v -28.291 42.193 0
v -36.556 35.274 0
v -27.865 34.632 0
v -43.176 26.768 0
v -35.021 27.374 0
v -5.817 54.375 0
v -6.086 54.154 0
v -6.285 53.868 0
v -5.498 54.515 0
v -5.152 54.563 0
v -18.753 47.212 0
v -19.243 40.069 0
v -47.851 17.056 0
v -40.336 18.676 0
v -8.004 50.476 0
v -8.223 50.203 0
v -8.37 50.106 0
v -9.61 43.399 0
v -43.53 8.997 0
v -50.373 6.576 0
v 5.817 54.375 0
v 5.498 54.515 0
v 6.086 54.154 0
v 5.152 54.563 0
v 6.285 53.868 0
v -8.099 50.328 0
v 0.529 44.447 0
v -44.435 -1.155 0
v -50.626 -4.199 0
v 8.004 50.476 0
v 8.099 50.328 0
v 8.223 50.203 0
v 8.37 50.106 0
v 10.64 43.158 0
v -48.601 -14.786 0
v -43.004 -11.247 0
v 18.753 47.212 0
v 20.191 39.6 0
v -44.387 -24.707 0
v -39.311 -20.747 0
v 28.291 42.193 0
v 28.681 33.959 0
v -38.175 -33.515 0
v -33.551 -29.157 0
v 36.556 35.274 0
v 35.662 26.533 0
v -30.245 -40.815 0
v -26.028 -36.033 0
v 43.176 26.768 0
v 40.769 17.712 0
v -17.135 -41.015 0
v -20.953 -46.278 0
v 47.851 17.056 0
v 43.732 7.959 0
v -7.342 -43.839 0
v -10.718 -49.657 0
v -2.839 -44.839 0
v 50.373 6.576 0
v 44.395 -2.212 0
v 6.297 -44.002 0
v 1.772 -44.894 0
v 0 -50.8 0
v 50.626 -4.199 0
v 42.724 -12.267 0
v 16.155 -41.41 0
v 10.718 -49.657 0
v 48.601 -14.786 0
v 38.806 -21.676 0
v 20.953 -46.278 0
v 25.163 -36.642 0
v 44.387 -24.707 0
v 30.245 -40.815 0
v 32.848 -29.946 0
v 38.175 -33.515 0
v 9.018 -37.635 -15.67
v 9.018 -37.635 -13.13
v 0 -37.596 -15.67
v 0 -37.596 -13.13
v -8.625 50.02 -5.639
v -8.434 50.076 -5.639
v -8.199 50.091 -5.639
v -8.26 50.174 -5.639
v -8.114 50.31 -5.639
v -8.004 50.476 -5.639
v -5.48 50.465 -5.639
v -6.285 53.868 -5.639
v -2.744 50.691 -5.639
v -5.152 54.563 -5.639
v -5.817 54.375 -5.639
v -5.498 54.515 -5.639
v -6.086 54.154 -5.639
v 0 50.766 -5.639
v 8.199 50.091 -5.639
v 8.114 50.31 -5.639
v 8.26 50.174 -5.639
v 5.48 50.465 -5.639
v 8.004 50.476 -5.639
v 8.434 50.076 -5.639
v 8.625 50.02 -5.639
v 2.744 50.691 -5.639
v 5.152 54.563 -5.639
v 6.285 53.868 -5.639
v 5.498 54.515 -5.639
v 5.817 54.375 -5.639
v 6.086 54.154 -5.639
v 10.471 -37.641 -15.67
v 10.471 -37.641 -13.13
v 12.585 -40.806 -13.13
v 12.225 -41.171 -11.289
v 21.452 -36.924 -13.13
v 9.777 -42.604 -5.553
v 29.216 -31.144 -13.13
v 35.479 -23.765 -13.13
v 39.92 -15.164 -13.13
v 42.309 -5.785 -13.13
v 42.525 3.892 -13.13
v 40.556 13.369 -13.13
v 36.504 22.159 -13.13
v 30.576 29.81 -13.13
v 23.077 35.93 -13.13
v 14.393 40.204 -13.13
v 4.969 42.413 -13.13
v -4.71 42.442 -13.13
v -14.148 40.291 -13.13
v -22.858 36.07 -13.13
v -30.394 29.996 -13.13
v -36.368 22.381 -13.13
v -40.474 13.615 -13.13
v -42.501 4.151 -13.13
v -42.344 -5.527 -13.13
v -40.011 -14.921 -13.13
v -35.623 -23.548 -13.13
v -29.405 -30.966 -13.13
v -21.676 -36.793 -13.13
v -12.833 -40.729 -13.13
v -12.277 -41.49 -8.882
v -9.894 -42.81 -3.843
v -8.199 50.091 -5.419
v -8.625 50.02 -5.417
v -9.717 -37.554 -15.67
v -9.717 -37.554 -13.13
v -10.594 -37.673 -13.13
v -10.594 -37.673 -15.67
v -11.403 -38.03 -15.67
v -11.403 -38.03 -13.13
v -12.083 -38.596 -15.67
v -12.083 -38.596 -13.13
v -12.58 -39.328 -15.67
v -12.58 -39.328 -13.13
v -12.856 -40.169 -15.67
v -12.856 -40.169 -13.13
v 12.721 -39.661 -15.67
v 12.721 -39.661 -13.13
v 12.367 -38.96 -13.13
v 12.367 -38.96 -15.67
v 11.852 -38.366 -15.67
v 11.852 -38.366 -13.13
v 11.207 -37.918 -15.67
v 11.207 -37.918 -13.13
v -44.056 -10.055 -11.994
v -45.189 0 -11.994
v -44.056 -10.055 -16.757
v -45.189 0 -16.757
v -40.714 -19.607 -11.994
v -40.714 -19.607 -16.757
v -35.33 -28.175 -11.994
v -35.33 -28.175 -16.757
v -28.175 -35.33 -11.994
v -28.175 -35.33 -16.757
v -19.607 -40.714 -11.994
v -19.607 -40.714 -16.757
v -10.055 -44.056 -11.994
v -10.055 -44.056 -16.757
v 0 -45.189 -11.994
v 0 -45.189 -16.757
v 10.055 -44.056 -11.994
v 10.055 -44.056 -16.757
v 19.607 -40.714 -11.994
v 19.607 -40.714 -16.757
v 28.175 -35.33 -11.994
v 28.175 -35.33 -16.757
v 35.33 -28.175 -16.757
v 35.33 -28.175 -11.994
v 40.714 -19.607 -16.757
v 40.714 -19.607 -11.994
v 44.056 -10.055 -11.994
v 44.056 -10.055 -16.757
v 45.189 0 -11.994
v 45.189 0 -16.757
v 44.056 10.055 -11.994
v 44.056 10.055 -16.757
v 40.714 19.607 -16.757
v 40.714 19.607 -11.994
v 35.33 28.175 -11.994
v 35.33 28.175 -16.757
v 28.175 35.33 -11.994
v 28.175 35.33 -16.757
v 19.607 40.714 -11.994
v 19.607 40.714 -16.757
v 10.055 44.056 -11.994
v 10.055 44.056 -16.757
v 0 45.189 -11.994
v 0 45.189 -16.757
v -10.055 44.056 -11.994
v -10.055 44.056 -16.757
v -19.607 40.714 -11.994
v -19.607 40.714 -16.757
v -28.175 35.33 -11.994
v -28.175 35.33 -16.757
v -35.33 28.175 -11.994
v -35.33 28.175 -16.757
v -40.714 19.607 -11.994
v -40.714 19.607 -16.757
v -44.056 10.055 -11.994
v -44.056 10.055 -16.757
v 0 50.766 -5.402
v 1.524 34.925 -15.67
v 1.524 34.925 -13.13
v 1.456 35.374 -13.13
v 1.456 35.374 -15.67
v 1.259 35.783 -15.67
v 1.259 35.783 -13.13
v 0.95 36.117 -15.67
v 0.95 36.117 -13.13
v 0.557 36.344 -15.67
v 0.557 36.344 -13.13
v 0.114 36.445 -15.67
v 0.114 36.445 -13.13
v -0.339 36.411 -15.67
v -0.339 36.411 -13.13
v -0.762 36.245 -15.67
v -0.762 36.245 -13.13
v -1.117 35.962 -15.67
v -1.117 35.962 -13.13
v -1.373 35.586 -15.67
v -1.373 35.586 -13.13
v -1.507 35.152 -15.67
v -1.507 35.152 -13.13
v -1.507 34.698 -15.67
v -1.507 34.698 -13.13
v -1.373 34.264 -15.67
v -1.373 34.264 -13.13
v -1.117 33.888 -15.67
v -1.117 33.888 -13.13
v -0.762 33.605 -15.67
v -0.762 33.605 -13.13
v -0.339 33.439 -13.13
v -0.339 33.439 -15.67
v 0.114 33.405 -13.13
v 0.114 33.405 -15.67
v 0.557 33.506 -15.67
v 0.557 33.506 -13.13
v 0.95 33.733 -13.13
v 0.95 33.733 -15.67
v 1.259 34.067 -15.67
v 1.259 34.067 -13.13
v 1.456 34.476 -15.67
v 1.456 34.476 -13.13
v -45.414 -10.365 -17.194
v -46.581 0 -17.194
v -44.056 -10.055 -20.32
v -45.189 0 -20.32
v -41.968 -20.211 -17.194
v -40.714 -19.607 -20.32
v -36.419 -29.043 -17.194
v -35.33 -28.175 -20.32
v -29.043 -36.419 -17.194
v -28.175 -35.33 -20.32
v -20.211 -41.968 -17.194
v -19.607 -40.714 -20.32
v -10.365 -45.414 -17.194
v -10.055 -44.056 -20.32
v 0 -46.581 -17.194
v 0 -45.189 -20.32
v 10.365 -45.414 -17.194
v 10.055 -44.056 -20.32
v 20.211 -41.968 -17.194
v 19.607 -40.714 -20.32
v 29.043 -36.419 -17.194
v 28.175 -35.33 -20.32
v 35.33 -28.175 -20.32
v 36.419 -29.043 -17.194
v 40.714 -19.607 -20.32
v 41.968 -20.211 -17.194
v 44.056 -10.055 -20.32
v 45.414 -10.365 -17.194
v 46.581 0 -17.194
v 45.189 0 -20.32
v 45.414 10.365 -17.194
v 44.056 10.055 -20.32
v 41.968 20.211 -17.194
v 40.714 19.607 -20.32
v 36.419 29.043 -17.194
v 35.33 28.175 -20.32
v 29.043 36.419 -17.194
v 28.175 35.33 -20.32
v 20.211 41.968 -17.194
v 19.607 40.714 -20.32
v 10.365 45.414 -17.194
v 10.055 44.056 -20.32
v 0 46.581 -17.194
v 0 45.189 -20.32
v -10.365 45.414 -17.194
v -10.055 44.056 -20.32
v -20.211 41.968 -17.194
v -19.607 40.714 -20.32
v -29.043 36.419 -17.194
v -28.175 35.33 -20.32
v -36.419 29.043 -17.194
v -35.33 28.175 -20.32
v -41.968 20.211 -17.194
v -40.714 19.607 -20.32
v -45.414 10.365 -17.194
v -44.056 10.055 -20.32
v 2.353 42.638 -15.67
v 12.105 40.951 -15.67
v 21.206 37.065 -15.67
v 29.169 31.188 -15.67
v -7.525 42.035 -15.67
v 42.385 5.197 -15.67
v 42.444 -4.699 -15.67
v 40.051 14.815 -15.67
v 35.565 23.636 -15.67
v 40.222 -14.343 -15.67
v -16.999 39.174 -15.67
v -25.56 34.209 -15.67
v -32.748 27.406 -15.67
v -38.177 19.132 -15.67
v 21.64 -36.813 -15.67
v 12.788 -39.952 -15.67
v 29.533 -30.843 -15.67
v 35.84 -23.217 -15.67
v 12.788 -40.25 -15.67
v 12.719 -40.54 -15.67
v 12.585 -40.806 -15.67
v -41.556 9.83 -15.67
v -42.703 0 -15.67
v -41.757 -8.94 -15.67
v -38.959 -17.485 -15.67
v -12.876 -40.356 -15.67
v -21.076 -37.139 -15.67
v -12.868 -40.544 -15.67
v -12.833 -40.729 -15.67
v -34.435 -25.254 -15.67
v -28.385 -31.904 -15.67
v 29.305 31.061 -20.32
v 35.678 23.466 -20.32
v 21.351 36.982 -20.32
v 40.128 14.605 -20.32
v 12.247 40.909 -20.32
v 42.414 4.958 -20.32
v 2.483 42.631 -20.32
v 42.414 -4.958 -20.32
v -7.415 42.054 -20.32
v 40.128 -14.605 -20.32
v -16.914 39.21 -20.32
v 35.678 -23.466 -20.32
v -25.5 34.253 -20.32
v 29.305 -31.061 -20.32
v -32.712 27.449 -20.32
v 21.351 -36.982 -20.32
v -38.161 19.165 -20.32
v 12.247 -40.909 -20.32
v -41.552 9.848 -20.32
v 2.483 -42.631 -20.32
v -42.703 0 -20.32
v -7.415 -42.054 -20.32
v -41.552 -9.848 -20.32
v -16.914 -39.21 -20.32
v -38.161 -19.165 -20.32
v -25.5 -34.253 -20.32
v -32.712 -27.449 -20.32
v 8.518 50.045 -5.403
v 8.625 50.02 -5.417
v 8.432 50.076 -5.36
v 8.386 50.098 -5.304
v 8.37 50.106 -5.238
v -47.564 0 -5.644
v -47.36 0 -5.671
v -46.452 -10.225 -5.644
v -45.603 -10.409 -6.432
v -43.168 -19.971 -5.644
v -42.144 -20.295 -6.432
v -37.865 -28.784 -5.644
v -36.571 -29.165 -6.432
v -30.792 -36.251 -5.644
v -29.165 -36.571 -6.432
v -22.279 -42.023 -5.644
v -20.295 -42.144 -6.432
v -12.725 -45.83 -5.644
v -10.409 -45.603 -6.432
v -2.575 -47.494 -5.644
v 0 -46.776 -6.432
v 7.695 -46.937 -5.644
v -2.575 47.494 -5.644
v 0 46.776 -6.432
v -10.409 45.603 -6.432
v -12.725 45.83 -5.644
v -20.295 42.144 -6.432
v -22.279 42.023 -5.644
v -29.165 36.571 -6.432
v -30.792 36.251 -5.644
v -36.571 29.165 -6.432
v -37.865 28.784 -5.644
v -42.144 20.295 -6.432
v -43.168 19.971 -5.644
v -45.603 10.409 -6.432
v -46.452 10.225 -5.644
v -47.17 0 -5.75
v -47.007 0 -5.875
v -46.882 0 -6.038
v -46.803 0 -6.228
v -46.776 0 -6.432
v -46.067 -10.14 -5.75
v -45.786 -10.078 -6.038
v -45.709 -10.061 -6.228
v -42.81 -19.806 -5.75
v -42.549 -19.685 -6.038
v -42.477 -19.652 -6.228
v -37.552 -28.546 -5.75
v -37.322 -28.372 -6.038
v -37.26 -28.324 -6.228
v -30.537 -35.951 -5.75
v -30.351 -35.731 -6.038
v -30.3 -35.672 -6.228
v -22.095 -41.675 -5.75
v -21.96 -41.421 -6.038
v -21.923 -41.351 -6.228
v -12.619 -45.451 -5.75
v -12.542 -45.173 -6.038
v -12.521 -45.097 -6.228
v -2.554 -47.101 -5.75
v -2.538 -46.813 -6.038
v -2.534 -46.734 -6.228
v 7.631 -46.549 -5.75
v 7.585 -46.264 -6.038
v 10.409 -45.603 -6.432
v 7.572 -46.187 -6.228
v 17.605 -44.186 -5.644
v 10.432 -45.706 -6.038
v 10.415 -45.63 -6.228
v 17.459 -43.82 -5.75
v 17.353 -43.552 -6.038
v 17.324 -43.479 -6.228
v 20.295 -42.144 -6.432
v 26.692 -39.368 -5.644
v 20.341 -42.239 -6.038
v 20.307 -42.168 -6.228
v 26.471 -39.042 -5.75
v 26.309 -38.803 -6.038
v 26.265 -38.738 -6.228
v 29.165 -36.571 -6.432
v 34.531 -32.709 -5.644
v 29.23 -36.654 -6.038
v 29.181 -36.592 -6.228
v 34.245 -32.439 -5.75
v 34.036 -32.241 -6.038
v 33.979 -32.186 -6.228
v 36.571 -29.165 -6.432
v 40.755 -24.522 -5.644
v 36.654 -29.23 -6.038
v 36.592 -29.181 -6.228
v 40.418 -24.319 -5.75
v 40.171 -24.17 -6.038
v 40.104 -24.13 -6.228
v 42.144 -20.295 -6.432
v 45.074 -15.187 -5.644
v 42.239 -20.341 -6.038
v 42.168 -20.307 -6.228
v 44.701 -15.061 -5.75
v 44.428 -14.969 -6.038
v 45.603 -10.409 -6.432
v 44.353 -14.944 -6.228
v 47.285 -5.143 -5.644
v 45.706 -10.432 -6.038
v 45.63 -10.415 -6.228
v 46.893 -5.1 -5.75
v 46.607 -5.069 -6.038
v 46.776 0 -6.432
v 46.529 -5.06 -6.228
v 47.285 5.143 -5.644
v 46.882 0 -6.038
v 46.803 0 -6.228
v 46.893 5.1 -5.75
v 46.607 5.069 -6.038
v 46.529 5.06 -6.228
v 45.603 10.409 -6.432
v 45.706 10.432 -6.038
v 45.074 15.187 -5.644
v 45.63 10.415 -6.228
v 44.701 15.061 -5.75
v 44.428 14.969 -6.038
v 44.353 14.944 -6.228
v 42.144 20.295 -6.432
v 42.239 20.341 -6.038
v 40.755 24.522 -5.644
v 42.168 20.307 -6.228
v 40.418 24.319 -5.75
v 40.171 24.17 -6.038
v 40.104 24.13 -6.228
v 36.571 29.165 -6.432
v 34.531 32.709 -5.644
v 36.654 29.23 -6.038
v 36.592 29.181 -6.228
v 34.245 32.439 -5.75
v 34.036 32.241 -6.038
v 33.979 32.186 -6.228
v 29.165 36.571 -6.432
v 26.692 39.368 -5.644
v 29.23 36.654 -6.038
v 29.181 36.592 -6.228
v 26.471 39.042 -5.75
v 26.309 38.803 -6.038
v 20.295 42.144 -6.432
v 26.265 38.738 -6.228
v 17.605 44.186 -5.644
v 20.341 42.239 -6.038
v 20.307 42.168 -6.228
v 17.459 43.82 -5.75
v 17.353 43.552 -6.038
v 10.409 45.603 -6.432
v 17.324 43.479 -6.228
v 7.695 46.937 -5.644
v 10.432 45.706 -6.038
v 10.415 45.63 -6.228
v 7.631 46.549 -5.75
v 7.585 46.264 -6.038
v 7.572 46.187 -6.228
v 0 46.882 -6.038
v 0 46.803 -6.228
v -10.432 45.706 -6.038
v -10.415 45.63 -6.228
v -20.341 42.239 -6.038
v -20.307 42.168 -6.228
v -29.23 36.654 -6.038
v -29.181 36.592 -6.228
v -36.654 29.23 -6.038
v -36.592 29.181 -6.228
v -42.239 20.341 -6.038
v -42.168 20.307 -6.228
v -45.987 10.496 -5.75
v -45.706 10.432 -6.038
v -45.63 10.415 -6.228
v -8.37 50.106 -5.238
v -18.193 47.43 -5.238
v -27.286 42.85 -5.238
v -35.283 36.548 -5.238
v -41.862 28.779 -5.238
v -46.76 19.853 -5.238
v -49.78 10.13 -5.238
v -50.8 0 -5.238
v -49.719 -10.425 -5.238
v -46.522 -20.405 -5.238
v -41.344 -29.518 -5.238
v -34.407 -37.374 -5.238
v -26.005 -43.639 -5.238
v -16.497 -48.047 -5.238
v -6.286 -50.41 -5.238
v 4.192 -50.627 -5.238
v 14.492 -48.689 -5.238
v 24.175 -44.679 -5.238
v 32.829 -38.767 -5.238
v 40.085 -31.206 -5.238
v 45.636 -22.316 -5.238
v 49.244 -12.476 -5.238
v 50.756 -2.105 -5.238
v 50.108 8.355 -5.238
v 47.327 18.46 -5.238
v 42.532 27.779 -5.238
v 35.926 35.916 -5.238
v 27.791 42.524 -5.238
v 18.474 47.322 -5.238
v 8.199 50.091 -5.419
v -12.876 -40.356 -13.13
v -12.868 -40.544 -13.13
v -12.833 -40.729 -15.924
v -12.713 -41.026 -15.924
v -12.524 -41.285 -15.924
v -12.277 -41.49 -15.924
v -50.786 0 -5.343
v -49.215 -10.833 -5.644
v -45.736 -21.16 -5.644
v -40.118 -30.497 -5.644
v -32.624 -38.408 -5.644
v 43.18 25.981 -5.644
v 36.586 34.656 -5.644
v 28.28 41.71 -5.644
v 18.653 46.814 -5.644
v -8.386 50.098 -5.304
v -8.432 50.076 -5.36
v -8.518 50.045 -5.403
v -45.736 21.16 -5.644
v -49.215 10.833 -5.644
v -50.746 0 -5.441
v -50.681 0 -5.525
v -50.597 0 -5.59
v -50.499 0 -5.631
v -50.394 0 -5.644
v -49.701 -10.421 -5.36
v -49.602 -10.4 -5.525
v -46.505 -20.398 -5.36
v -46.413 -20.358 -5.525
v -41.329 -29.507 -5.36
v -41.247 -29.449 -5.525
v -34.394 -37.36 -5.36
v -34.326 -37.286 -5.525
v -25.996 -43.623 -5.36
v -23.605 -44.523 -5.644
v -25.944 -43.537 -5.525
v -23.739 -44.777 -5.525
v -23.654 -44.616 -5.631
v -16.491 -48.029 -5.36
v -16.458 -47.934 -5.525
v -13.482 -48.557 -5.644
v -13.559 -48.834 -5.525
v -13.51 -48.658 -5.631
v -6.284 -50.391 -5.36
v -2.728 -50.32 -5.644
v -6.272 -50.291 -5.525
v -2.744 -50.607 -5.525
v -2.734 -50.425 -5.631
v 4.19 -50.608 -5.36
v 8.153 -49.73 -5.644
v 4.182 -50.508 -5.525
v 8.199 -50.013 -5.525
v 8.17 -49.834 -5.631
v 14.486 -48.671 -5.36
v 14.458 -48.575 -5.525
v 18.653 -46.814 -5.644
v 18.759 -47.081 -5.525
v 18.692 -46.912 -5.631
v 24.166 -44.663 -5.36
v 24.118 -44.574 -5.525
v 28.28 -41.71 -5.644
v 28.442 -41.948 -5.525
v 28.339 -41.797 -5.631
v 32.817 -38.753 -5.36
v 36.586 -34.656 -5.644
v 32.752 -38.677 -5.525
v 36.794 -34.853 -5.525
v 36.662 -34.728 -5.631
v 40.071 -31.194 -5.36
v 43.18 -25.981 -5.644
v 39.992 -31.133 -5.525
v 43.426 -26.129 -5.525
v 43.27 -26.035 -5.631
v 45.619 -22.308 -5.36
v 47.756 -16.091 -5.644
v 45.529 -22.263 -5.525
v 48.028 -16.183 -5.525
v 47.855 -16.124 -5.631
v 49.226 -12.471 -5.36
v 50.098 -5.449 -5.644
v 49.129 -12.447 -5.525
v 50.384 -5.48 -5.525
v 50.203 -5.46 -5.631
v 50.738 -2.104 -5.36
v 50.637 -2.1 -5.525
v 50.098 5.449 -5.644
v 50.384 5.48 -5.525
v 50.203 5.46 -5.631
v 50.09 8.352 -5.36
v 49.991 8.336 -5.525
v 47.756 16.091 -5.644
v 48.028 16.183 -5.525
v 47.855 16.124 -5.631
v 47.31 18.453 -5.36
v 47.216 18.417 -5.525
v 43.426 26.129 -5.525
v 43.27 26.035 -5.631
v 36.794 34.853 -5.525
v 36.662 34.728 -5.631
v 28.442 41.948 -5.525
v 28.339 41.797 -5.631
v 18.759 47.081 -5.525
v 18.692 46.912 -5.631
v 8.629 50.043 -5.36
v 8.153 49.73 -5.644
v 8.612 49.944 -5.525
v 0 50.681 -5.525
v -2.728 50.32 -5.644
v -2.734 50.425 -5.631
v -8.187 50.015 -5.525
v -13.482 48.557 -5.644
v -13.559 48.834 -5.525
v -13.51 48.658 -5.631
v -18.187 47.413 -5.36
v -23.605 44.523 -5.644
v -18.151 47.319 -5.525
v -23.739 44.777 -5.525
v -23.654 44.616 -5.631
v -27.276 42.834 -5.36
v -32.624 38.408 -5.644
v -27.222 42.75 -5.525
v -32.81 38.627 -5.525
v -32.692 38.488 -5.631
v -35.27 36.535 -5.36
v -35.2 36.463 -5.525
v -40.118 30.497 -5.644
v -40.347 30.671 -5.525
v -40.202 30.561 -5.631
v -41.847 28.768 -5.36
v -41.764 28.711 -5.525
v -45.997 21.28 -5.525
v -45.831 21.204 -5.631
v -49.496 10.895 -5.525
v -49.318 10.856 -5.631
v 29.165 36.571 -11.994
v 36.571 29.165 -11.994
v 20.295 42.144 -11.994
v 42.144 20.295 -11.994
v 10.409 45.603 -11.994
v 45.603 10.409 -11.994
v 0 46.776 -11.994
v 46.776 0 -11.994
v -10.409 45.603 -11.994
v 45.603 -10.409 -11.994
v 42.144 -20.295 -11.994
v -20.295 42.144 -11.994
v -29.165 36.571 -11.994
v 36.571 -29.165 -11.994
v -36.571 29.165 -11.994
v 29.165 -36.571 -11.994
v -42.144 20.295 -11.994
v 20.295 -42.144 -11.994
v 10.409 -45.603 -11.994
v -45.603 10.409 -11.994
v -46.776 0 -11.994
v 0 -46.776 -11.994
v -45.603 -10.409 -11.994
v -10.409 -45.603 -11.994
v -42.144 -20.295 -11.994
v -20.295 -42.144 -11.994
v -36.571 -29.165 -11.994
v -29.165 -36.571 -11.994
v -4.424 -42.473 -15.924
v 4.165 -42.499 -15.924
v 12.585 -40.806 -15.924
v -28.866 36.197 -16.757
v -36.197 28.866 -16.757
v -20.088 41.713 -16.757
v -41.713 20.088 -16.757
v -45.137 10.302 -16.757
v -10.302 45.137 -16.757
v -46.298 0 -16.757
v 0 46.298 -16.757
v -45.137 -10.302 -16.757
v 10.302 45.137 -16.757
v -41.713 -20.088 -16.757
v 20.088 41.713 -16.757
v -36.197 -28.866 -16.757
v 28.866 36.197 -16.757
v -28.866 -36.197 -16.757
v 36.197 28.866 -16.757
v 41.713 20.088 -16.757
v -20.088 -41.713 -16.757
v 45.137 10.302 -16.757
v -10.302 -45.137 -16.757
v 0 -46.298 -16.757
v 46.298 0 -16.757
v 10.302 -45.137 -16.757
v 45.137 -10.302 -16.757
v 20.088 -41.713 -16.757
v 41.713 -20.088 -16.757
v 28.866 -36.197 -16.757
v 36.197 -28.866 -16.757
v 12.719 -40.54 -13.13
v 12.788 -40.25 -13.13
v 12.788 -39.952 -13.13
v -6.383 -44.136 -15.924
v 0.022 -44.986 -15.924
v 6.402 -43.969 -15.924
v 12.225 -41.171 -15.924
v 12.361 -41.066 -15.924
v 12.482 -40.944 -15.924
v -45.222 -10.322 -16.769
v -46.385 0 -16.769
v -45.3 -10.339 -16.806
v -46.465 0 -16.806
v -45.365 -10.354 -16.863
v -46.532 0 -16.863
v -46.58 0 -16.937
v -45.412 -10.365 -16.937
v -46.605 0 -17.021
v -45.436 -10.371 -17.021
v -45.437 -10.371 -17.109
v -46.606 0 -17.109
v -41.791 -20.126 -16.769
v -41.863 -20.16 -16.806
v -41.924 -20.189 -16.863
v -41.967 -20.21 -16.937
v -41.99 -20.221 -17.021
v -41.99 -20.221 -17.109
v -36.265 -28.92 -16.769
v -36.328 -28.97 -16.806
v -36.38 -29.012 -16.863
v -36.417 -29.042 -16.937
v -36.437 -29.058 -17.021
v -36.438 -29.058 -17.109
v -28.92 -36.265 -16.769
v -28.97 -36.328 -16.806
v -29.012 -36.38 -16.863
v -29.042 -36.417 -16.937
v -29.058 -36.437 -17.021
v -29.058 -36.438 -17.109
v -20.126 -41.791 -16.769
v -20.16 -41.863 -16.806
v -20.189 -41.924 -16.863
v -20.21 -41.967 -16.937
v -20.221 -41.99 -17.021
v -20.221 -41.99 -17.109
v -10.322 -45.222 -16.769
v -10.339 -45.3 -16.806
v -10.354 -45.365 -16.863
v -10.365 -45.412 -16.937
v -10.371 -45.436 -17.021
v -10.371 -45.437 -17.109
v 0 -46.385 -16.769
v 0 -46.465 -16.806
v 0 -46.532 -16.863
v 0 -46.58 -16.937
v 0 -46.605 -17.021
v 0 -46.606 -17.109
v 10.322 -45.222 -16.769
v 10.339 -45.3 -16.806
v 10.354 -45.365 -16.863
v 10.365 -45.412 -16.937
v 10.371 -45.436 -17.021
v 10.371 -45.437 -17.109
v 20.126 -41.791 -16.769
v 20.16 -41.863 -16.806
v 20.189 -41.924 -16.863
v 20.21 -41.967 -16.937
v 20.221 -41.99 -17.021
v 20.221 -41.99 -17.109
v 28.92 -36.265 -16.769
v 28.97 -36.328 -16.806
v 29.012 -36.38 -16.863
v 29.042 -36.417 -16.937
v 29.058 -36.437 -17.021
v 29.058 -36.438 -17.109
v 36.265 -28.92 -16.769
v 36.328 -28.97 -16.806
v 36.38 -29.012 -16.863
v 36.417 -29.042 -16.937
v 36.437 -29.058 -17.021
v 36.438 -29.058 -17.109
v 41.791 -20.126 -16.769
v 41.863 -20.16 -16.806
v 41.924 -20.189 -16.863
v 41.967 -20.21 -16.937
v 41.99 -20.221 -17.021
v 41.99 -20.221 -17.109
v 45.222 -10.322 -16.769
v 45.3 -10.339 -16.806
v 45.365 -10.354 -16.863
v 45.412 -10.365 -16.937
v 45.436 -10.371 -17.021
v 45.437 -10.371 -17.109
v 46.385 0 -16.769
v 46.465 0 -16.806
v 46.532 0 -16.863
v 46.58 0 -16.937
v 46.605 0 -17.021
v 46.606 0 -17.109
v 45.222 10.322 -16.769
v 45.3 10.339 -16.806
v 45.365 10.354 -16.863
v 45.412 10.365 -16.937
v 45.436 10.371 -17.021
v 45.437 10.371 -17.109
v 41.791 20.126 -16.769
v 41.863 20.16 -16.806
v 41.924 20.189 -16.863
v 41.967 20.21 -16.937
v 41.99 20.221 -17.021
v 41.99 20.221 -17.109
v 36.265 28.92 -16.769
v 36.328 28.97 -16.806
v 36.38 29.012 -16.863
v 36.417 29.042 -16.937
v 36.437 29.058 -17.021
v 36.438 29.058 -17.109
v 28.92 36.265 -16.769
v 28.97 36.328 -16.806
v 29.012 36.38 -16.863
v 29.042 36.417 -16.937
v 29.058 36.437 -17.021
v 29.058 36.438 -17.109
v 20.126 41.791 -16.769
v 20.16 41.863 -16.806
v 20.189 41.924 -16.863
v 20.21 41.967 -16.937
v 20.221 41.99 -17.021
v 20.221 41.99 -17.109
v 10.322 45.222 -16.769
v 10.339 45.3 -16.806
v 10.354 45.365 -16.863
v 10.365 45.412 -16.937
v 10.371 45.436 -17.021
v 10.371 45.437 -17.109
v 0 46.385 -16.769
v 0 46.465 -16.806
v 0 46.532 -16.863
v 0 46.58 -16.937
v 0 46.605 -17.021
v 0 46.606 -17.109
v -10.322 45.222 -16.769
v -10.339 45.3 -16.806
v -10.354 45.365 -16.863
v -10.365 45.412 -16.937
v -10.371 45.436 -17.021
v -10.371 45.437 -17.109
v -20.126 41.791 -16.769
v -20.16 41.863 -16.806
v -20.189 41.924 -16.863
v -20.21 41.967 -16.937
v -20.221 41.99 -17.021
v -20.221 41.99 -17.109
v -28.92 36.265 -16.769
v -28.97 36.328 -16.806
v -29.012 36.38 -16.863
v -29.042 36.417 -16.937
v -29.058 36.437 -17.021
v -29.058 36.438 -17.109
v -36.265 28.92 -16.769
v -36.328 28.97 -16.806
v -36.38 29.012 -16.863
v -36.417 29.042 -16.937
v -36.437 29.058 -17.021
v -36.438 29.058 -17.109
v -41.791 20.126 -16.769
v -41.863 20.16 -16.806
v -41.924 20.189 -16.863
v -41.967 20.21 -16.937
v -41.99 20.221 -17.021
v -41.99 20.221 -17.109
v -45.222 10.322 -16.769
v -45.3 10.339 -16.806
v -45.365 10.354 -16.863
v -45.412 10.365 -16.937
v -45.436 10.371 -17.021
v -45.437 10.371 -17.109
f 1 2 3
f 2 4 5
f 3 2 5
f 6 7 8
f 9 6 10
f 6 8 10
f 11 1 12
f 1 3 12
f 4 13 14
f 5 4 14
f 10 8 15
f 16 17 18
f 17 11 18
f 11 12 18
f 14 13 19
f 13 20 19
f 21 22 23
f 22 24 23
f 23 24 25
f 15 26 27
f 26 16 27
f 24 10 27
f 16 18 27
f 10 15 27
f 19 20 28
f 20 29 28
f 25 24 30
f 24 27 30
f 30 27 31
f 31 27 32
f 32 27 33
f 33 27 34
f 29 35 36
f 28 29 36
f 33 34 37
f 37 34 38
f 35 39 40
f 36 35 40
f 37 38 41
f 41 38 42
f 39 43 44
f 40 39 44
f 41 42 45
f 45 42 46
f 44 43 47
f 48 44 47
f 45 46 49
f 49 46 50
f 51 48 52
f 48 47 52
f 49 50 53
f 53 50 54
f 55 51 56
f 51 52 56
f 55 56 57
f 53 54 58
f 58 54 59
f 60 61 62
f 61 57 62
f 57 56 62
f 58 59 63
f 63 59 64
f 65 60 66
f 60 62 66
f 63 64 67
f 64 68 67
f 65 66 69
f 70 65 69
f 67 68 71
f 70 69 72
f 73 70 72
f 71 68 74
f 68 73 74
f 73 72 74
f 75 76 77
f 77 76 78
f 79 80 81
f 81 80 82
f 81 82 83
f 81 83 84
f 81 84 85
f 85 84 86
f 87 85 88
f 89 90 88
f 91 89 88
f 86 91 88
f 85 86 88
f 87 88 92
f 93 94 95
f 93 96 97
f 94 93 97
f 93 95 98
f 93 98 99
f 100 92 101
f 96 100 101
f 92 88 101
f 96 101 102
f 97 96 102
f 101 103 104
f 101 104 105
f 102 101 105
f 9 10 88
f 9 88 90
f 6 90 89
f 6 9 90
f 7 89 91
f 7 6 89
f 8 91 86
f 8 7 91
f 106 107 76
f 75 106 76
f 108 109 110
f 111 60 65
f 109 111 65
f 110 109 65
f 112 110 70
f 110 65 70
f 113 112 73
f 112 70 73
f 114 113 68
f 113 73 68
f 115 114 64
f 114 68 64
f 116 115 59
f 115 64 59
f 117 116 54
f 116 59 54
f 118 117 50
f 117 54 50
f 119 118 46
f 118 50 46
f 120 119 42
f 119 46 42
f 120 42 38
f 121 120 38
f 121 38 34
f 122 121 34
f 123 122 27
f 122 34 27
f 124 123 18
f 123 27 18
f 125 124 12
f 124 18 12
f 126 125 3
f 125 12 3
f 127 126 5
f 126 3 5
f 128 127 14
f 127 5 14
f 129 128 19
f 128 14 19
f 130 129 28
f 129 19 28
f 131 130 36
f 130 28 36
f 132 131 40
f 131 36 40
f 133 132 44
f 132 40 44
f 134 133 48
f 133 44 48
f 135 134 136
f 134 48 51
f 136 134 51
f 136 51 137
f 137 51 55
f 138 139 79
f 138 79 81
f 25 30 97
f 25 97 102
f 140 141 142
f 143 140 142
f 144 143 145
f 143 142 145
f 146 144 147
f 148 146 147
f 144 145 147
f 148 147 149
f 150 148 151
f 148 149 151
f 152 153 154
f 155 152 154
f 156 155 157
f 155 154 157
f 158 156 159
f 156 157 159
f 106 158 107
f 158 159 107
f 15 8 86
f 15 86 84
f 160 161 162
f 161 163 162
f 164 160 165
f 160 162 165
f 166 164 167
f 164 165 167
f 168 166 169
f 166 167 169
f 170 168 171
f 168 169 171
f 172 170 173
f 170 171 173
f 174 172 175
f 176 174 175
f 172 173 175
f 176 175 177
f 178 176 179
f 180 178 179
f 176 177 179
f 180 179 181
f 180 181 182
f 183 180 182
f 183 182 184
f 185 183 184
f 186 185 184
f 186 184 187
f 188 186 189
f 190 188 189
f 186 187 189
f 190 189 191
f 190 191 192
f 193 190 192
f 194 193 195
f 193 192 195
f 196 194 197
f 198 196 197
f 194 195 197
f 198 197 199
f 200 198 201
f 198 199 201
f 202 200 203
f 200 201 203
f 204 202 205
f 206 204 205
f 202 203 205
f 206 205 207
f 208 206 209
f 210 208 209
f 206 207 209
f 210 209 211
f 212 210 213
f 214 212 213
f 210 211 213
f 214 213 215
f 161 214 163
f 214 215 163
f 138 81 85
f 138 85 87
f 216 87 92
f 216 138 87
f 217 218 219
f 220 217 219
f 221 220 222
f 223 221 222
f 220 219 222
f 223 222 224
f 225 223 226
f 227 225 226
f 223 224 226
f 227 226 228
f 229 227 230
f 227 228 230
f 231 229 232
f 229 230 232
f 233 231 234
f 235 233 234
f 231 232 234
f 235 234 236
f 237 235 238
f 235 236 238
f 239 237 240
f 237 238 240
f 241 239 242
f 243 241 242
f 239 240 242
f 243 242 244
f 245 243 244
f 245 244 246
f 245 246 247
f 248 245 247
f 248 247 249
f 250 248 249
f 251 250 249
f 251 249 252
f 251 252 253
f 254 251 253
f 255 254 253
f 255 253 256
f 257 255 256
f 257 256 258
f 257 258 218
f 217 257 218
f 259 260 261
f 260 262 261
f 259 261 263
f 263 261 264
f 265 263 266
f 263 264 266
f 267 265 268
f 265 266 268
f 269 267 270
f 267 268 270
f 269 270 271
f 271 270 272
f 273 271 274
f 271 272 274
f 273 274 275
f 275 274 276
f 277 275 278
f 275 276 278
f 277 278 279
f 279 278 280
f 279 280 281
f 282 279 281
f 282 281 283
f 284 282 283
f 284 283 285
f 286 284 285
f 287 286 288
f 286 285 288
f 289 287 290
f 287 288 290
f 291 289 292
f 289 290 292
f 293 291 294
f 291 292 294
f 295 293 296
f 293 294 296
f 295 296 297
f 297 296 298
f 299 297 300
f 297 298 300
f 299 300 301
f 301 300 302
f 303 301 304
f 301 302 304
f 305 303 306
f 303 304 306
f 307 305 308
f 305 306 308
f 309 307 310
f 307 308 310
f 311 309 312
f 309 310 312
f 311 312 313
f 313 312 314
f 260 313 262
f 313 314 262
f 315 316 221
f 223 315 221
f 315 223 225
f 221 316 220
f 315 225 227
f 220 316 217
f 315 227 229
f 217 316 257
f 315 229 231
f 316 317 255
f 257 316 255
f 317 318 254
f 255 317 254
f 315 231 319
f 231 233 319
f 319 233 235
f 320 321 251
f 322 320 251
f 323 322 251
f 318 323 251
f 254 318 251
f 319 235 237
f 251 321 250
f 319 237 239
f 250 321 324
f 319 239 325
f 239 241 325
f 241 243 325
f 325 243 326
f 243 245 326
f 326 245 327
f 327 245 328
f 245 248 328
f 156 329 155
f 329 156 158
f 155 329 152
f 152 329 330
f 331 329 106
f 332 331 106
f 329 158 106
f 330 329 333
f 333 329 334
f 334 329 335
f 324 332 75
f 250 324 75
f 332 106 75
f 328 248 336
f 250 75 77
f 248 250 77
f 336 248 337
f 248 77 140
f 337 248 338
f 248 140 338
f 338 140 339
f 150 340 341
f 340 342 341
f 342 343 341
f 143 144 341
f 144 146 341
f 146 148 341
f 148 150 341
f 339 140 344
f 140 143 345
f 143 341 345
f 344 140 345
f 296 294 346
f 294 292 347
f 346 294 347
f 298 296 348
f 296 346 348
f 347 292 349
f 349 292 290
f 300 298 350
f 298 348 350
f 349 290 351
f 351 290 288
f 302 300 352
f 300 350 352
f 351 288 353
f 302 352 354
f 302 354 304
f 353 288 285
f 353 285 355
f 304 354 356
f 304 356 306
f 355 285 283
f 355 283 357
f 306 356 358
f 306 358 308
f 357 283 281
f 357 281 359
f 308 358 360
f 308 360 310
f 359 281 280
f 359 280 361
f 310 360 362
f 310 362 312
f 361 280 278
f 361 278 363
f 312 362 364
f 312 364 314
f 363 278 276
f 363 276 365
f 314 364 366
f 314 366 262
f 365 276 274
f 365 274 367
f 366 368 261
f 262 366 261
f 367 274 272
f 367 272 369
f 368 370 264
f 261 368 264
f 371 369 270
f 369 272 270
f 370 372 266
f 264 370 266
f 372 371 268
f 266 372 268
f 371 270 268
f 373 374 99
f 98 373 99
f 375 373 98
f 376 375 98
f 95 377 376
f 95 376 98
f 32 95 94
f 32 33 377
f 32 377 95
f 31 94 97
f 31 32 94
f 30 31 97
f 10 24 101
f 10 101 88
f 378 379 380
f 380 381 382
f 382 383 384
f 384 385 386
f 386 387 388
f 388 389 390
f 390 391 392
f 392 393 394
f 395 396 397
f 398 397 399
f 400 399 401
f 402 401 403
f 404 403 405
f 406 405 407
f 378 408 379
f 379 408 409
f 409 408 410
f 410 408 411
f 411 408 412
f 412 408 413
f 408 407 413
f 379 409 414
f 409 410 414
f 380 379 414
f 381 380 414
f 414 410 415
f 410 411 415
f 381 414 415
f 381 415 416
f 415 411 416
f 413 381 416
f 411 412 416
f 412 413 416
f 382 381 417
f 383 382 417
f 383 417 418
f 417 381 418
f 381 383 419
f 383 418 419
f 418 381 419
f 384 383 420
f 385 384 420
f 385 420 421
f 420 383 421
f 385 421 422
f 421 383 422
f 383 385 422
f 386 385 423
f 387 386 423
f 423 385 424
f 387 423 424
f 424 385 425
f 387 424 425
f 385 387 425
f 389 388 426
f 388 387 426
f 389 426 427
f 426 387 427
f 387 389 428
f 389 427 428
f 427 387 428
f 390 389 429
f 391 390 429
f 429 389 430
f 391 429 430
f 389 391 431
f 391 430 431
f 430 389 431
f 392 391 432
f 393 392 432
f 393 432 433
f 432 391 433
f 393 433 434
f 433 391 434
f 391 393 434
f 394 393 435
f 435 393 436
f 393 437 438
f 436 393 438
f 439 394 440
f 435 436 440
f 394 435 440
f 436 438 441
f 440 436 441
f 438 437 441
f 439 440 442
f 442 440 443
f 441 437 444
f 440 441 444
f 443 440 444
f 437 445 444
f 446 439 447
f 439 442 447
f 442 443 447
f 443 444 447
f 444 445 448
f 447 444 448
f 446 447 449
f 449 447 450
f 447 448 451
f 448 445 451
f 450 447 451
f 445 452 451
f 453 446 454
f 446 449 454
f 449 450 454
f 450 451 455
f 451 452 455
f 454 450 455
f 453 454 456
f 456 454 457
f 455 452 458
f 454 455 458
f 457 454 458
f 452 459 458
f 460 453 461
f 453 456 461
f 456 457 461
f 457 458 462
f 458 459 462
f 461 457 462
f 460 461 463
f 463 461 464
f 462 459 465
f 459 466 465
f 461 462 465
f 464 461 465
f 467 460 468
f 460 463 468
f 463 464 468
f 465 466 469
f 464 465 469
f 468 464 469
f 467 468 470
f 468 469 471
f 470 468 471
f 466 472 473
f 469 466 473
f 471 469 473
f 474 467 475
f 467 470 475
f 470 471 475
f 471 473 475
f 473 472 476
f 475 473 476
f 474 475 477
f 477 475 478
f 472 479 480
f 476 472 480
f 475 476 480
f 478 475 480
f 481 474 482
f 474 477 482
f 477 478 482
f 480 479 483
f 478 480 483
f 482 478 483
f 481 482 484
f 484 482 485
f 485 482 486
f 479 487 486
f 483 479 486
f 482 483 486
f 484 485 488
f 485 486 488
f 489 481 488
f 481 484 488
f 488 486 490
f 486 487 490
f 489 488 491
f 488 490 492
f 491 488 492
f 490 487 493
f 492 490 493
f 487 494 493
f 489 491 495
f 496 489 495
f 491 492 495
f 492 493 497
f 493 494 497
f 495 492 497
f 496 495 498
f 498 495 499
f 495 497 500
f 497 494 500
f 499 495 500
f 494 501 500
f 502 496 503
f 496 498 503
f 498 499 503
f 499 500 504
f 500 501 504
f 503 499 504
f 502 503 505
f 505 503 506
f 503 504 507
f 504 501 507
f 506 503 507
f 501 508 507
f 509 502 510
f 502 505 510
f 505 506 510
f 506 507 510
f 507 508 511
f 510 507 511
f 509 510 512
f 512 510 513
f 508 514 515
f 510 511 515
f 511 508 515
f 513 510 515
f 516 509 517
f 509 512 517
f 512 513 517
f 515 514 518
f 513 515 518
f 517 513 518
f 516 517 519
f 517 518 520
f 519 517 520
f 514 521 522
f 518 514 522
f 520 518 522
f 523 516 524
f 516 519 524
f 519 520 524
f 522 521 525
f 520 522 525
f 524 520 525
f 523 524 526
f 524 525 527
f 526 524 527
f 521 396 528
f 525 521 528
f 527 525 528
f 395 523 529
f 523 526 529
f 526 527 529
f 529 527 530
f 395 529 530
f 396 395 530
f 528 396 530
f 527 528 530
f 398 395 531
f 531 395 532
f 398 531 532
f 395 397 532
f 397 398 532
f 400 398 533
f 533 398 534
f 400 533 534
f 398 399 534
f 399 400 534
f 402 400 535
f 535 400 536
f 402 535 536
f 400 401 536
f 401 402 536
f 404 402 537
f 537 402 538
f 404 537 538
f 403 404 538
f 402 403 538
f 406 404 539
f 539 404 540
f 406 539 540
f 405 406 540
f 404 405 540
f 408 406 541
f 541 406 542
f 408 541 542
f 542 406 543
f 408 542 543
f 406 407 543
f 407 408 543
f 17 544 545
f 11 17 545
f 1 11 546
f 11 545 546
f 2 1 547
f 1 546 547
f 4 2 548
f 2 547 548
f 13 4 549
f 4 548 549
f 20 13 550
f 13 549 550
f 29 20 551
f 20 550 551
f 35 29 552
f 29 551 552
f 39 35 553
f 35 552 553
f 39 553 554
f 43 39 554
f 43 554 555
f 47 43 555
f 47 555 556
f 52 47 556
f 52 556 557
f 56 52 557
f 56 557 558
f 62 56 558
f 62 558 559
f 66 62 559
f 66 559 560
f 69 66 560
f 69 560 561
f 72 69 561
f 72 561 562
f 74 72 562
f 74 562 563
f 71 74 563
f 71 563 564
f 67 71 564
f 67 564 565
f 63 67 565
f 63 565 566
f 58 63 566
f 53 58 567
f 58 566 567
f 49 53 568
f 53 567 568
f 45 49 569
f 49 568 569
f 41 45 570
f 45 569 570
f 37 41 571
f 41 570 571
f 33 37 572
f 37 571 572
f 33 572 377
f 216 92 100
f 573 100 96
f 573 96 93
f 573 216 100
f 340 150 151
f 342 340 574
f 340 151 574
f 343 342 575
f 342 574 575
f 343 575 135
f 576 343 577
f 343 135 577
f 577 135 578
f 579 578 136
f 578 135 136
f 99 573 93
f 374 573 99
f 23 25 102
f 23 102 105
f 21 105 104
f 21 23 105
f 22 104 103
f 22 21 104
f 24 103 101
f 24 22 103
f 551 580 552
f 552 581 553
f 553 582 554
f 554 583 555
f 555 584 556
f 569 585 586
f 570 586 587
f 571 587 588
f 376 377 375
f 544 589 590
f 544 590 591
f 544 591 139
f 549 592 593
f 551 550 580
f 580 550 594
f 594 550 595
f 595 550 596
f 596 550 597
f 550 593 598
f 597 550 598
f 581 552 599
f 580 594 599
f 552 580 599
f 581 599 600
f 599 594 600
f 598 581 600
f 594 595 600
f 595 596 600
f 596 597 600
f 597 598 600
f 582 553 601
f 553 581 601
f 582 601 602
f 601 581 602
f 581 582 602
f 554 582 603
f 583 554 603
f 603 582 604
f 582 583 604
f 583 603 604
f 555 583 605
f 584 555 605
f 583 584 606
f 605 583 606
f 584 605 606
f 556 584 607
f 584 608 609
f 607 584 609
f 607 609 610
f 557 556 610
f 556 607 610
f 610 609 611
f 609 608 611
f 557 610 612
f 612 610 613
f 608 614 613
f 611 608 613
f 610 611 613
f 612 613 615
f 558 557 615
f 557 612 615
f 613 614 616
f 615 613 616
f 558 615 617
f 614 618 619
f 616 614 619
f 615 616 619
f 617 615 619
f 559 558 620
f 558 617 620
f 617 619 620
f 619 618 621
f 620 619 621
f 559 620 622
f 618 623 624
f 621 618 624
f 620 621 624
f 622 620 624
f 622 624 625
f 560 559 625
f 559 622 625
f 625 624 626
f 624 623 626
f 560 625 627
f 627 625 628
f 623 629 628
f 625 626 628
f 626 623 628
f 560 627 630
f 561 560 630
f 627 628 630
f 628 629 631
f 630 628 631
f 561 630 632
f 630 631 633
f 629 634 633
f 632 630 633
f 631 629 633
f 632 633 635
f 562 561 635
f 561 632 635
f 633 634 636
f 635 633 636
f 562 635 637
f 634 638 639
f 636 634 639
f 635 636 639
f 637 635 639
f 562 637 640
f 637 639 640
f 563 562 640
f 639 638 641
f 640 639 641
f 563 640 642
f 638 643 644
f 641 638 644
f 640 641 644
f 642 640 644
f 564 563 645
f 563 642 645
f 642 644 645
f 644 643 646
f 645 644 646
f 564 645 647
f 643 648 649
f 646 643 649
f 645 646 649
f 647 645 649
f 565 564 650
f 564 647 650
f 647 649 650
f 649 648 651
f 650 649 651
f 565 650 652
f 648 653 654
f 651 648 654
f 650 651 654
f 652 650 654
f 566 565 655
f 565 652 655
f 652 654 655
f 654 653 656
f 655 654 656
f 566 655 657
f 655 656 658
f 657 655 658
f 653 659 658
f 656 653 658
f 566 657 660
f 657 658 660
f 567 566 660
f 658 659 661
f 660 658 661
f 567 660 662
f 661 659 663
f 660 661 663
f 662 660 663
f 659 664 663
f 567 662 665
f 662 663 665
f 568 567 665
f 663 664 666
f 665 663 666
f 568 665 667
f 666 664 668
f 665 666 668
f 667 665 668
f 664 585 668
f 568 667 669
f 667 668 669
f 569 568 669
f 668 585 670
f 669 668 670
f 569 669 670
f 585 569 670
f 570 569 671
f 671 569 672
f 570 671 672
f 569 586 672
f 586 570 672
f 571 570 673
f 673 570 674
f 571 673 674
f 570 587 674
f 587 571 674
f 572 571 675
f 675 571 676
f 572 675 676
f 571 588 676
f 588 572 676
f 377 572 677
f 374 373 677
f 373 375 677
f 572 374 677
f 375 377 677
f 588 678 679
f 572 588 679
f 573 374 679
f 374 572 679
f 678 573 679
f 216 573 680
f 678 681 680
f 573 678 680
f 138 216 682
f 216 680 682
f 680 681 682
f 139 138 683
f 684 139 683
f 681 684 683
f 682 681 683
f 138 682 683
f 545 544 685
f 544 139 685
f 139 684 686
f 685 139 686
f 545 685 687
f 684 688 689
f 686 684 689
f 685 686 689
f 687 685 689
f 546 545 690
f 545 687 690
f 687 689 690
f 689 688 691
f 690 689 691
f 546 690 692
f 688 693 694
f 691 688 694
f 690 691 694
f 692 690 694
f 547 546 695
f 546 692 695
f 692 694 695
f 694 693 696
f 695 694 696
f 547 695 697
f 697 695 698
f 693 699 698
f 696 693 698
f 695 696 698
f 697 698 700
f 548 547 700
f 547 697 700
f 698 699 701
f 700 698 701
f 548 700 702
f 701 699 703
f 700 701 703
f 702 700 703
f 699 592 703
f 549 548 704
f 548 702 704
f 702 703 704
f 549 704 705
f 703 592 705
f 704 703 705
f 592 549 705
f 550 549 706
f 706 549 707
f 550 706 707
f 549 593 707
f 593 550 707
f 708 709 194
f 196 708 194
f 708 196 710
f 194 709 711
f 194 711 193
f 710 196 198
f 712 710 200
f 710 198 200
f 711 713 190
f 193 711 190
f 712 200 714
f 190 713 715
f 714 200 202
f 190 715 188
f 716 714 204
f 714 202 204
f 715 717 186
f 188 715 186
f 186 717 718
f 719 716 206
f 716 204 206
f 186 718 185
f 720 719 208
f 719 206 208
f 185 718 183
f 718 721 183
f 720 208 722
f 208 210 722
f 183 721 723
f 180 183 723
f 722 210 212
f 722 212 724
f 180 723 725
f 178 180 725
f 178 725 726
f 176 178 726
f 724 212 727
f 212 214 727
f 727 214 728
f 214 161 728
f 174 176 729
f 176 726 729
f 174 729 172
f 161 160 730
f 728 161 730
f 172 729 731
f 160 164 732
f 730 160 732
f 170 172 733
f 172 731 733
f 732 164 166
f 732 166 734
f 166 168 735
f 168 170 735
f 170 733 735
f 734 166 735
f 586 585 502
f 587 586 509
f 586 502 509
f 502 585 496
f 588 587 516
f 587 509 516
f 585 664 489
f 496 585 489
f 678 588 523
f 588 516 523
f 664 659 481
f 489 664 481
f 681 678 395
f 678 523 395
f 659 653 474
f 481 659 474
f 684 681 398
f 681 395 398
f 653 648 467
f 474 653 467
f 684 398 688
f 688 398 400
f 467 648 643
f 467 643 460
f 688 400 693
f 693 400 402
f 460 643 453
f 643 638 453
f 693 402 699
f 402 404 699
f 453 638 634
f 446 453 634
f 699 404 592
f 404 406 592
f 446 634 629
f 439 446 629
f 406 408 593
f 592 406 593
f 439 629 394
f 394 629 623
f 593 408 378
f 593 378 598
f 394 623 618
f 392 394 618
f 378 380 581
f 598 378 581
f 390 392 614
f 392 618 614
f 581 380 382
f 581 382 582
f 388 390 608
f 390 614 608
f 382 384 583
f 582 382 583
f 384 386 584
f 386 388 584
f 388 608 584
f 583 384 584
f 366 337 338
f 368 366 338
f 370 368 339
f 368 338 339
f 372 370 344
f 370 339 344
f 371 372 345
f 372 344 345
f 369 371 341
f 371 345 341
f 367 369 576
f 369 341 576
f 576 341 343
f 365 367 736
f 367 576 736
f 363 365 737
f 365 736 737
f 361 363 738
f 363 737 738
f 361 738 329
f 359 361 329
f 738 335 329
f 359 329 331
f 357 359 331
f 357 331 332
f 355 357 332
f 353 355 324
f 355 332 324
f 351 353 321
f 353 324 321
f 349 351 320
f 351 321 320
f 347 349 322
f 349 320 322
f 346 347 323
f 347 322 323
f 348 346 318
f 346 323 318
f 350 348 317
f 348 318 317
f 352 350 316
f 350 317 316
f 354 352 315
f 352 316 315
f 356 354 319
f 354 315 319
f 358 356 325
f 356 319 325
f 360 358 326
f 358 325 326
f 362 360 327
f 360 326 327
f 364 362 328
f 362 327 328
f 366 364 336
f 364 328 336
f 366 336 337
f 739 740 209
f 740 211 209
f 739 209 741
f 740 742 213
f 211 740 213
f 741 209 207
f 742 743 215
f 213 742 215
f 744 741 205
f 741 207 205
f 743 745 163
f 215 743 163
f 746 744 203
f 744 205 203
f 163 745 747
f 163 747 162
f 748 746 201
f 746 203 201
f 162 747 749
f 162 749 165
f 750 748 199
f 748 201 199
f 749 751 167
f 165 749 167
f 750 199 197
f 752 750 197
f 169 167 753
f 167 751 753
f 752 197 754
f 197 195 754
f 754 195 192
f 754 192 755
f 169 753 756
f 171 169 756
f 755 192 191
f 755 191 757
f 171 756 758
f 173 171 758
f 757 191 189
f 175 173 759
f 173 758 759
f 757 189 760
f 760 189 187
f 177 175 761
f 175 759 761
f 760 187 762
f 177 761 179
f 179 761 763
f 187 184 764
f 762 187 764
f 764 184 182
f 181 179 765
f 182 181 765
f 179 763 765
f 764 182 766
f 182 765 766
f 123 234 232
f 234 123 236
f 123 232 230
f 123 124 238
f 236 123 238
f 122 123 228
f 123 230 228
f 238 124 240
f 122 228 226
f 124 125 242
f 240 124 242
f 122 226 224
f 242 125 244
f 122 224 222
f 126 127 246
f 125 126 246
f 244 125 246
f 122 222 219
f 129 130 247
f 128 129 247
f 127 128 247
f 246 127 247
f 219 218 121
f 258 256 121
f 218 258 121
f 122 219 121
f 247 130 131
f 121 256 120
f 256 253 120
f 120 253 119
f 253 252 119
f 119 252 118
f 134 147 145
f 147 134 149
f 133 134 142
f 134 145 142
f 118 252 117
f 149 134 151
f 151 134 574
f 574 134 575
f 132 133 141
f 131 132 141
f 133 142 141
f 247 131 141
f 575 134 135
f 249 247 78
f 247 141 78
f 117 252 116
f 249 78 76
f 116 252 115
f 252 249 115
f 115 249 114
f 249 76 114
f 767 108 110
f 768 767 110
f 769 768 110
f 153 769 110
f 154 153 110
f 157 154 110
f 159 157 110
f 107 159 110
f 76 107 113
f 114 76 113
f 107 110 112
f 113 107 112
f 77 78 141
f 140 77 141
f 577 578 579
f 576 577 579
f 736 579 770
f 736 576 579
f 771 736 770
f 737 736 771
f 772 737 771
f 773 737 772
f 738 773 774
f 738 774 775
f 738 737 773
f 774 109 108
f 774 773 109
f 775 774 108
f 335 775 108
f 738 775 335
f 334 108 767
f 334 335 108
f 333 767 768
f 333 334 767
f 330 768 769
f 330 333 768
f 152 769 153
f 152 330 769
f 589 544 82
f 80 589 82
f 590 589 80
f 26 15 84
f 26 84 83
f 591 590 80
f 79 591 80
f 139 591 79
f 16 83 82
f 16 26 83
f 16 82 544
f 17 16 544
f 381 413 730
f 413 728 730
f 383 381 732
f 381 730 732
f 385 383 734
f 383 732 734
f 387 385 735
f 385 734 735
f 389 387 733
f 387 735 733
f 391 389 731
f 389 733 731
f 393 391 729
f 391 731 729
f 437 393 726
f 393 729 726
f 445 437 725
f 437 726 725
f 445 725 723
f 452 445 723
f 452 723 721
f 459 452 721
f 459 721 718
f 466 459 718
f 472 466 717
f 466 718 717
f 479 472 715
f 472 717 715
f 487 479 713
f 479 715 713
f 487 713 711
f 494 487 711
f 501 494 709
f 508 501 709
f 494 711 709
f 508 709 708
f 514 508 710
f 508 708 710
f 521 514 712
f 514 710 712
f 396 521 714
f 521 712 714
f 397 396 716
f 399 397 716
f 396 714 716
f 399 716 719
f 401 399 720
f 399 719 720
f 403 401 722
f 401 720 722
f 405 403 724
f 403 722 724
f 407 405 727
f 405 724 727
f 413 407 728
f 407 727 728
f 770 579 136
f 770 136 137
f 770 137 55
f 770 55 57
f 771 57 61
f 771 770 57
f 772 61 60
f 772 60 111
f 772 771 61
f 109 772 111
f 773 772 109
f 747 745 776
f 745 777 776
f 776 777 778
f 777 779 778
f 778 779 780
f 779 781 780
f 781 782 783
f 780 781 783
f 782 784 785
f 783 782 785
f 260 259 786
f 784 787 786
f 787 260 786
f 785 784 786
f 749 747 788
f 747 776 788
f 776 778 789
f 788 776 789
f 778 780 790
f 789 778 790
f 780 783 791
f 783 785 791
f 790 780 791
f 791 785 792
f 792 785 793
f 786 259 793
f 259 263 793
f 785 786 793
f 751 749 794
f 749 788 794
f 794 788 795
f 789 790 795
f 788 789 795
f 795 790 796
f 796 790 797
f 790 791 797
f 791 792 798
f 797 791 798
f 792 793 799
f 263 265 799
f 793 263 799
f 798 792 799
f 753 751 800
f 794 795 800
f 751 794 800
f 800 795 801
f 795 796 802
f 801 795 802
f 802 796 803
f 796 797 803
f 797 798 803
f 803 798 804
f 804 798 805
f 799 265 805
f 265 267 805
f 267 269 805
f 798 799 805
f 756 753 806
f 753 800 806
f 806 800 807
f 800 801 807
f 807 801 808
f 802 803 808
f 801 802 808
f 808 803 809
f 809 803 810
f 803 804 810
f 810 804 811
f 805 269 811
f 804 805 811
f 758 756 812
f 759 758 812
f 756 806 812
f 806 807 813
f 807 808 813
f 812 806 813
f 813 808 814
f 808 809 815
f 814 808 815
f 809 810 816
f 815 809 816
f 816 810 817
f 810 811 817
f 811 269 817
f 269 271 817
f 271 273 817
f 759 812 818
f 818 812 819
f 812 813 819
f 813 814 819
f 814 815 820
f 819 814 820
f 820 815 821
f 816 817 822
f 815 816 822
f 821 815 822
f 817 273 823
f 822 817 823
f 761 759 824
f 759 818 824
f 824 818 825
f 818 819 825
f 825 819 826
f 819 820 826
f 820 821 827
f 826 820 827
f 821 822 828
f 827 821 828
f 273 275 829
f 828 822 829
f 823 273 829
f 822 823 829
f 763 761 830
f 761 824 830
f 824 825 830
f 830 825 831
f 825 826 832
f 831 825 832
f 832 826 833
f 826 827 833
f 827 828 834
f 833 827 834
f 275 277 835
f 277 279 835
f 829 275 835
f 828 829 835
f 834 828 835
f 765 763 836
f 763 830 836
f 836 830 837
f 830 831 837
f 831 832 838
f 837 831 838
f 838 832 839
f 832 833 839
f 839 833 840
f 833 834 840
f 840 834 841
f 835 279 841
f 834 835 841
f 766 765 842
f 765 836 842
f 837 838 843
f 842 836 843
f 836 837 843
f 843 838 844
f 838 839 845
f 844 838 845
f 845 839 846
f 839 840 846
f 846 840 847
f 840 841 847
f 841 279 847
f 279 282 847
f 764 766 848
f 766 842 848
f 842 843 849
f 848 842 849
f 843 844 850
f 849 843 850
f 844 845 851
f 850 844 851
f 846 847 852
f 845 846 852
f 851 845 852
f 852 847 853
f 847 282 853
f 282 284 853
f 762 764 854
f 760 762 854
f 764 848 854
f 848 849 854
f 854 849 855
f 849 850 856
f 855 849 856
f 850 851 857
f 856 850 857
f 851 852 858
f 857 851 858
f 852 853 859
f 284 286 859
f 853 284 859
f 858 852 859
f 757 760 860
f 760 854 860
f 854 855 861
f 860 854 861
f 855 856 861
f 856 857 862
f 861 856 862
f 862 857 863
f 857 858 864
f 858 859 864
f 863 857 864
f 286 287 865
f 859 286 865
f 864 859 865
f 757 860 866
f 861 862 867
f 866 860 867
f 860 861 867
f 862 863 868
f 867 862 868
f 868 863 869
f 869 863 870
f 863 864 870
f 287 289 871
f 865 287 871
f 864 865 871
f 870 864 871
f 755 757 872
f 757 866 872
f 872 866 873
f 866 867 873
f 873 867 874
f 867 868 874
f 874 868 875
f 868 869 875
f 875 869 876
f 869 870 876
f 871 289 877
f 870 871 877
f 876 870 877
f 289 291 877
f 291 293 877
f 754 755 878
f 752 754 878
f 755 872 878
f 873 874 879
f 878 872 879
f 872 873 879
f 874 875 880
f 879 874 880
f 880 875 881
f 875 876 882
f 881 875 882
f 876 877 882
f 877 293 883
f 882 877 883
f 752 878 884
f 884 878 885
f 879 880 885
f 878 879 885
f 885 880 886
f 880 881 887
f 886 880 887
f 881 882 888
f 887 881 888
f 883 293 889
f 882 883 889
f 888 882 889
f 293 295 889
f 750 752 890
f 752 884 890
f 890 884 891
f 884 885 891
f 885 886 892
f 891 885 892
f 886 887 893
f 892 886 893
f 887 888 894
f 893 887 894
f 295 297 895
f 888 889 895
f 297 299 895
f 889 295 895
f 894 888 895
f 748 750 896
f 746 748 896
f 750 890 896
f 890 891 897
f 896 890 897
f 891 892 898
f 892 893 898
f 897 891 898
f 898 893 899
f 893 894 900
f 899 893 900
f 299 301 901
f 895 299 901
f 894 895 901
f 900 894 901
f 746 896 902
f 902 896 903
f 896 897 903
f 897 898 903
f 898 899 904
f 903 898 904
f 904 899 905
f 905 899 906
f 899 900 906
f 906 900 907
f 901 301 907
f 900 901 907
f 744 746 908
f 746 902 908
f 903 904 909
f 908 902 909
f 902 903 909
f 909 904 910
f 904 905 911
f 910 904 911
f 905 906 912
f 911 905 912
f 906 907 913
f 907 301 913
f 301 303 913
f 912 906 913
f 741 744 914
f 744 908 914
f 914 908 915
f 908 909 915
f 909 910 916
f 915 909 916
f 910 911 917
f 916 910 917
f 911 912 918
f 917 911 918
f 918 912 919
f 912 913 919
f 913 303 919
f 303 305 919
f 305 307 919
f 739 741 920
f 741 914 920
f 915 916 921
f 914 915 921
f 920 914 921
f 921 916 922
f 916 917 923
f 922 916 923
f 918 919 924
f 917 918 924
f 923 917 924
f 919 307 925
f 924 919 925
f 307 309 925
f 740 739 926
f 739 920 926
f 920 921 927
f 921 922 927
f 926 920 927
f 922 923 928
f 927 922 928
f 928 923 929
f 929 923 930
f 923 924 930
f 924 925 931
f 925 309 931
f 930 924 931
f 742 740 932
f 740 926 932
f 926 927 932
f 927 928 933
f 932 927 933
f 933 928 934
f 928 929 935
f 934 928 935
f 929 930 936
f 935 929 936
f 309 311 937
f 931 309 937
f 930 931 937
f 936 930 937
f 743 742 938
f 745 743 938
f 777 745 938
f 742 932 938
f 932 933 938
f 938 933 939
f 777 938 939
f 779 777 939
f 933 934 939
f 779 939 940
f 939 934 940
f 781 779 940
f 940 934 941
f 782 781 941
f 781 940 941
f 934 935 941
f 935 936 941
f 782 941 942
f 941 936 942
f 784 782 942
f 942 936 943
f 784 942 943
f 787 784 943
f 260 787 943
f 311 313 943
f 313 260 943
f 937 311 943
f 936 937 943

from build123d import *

# Parameters (mm, degrees)
F4_DEPTH = 2.794
F5_DEPTH = 25.4
F6_R     = 1.524
F7_DEPTH = 25.4
F9_DEPTH = 5.6388


with BuildPart() as f1:
    # F0 (on Front) → F1 (revolve)
    with BuildSketch(Plane.XZ):
        with BuildLine():
            Line((-42.70291, -13.129885), (-44.45, 0))
            Line((-44.45, 0), (-50.3936, 0))
            Line((-50.3936, 0), (-50.8, 0))
            Line((-50.8, 0), (-50.8, -0.4064))
            Line((-50.8, -0.4064), (-50.8, -5.238044))
            ThreePointArc((-50.8, -5.238044), (-50.680968, -5.525413), (-50.3936, -5.644444))
            Line((-50.3936, -5.644444), (-47.563638, -5.644444))
            ThreePointArc((-47.563638, -5.644444), (-47.006862, -5.875069), (-46.776238, -6.431844))
            Line((-46.776238, -6.431844), (-46.776238, -11.994444))
            Line((-46.776238, -11.994444), (-45.188738, -11.994444))
            Line((-45.188738, -11.994444), (-45.188738, -16.756944))
            Line((-45.188738, -16.756944), (-46.29761, -16.756944))
            ThreePointArc((-46.29761, -16.756944), (-46.558236, -16.898475), (-46.581447, -17.194142))
            Line((-46.581447, -17.194142), (-45.188738, -20.32))
            Line((-45.188738, -20.32), (-42.70291, -20.32))
            Line((-42.70291, -20.32), (-42.70291, -15.669885))
            Line((-42.70291, -15.669885), (0, -15.669885))
            Line((0, -15.669885), (0, -13.129885))
            Line((0, -13.129885), (-42.70291, -13.129885))
        make_face()
    revolve(axis=Axis((0, 0, -10.16), (0, 0, 1)))

    # F3 (on offset) → F4 (cut)
    with BuildSketch(Plane.XY.offset(-13.129885)):
        with BuildLine():
            Line((9.017678, -37.635088), (0, -37.596034))
            Line((0, -37.596034), (-9.717249, -37.55395))
            ThreePointArc((-9.717249, -37.55395), (-11.76304, -38.289364), (-12.85615, -40.168513))
            ThreePointArc((-12.85615, -40.168513), (-12.767446, -40.917369), (-12.276714, -41.489938))
            ThreePointArc((-12.276714, -41.489938), (0.021671, -44.985599), (12.224982, -41.171267))
            ThreePointArc((12.224982, -41.171267), (12.731825, -40.501367), (12.721155, -39.661401))
            ThreePointArc((12.721155, -39.661401), (11.852038, -38.366333), (10.471091, -37.641383))
            Line((10.471091, -37.641383), (9.017678, -37.635088))
        make_face()
    extrude(amount=-F4_DEPTH, mode=Mode.SUBTRACT)

    # F3 (on offset) → F5 (cut)
    with BuildSketch(Plane.XY.offset(-13.129885)):
        with BuildLine():
            ThreePointArc((1.524, 34.925), (-1.077631, 36.002631), (0, 33.401))
            ThreePointArc((0, 33.401), (1.077631, 33.847369), (1.524, 34.925))
        make_face()
        with BuildLine():
            Line((9.017678, -37.635088), (0, -37.596034))
            Line((0, -37.596034), (-9.717249, -37.55395))
            ThreePointArc((-9.717249, -37.55395), (-11.76304, -38.289364), (-12.85615, -40.168513))
            ThreePointArc((-12.85615, -40.168513), (-12.767446, -40.917369), (-12.276714, -41.489938))
            ThreePointArc((-12.276714, -41.489938), (0.021671, -44.985599), (12.224982, -41.171267))
            ThreePointArc((12.224982, -41.171267), (12.731825, -40.501367), (12.721155, -39.661401))
            ThreePointArc((12.721155, -39.661401), (11.852038, -38.366333), (10.471091, -37.641383))
            Line((10.471091, -37.641383), (9.017678, -37.635088))
        make_face()
        with BuildLine():
            ThreePointArc((10.471091, -37.641383), (9.74475, -37.55395), (9.017678, -37.635088))
            Line((9.017678, -37.635088), (10.471091, -37.641383))
        make_face()
    extrude(amount=F5_DEPTH, mode=Mode.SUBTRACT)

    # F6 (on offset) → F7 (cut)
    with BuildSketch(Plane.XY.offset(-13.129885)):
        with Locations((0, 34.925)):
            Circle(F6_R)
    extrude(amount=-F7_DEPTH, mode=Mode.SUBTRACT)

    # F8 (on Top) → F9 (join)
    with BuildSketch(Plane.XY):
        with BuildLine():
            ThreePointArc((-8.199207, 50.090913), (-4.113462, 50.596688), (0, 50.76566))
            Line((0, 50.76566), (0, 54.563351))
            Line((0, 54.563351), (-5.152237, 54.563351))
            ThreePointArc((-5.152237, 54.563351), (-5.816961, 54.375498), (-6.285039, 53.867511))
            Line((-6.285039, 53.867511), (-8.003992, 50.476065))
            Line((-8.003992, 50.476065), (-8.199207, 50.090913))
        make_face()
        with BuildLine():
            Line((0, 54.563351), (0, 50.76566))
            ThreePointArc((0, 50.76566), (4.113462, 50.596688), (8.199207, 50.090913))
            Line((8.199207, 50.090913), (8.003992, 50.476065))
            Line((8.003992, 50.476065), (6.285039, 53.867511))
            ThreePointArc((6.285039, 53.867511), (5.816961, 54.375498), (5.152237, 54.563351))
            Line((5.152237, 54.563351), (0, 54.563351))
        make_face()
        with BuildLine():
            Line((8.003992, 50.476065), (8.199207, 50.090913))
            Line((8.199207, 50.090913), (8.625197, 50.020322))
            ThreePointArc((8.625197, 50.020322), (8.260189, 50.174036), (8.003992, 50.476065))
        make_face()
        with BuildLine():
            Line((-8.625197, 50.020322), (-8.199207, 50.090913))
            Line((-8.199207, 50.090913), (-8.003992, 50.476065))
            ThreePointArc((-8.003992, 50.476065), (-8.260189, 50.174036), (-8.625197, 50.020322))
        make_face()
    extrude(amount=-F9_DEPTH)


solid = f1.part
